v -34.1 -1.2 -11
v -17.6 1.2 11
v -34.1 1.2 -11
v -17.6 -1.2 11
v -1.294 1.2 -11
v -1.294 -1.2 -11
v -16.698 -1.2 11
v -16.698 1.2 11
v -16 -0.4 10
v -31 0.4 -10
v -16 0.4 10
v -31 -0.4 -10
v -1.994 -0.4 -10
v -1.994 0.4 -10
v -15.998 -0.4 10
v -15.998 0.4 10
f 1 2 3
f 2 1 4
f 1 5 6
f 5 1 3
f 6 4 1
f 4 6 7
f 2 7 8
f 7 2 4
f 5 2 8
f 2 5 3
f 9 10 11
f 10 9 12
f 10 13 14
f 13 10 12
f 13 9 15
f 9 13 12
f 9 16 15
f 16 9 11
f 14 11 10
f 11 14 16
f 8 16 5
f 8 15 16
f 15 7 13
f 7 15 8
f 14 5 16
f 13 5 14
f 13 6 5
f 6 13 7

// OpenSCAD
// file: craftKnife.scad
/*
    A knife handle for use with disposable razor blade. These blades can be easily found in 
    DIY stores, and pound shops as well as supermarkets.
    It requires the classic shaped blades with a hole in the middle. I found them in a pound shop.

	The blade is held in place by a wedge.
	
	Print Notes.
	    You can use a low infill (I use 10%)
	    The back of the knife tends to lift off of the bed, so either use a brim, or use the
	    "splat" module to help it adhere.
*/

length = 120; // Length of the knife
width = 23; // Must be a little larger than the width of the blade.
thickness = 10; // Thickness of the knife
extraThickness = 2; // Taper the top front of the knife.

hole = 6; // Diameter of the hole/wedge which holds the blade.
taper = 1; // Amount of taper on the wedge
slack = 0.5; // How much smaller the wedge is to the hole that it fits into.

module body()
{
	foo = 3; // Radius of the extra spheres for the wider top. (For asthetics only)
	bar = extraThickness * width/thickness/2 + width / 2; // Z offset for the extra spheres.
	difference() {
		translate([-5,0,0]) scale( [1,1,thickness/width] ) hull() {
			translate( [7,0,0] ) sphere( d=width ); // Front
			translate( [length - width,0,0] ) sphere( d=width ); // Back
			translate( [-10+foo, width/2 - foo, bar-foo] ) sphere( r=foo ); // Wider top
			translate( [-10+foo, width/2 - foo,-bar+foo] ) sphere( r=foo ); // Wider top
		}
	}
}

module bladeHole( thickness=1.5 )
{
	height=20;
	width=62;
	translate([-width/2,-height/2,-thickness/2]) linear_extrude( thickness ) {
		polygon( [[0,0],[62,0],[width-15,height],[15,height]] );
	}
}

module knife()
{

	difference() {
		body( length, width, thickness, extraThickness );
		bladeHole(); // gap for blade to fit in.
		translate( [0,0,-thickness] ) cylinder( d1=hole+slack+taper, d2=hole+slack-taper, h=thickness*2 );
	}
}

module wedge(void=true)
{
	difference() {
		intersection() {
			body( length, width, thickness, extraThickness );
			translate( [0,0,-thickness] ) cylinder( d1=hole+taper, d2=hole-taper, h=thickness*2 );
		}
		if (void) {
		    // Create a tiny void, which will force the slicer to make it more solid!
		    #translate( [0,0,-width/4+2] ) cylinder( d=0.4, h=20+width/2-4 ); 
	    }
	}
}

/*
    A bodge to held the back of the knife adhere to the print bed.
*/
module splat(d=15, h=0.3 )
{
    translate([length-27,0,-11.43]) cylinder( d=d, h=h );
}

// Rotate the knife, so that the top of the knife is on the build plate.
rotate( [-90,0,0] ) knife();

// A little bit of a bodge to allow the wedge to be printed at the same time as the knife,
// and to make one edge of the wedge to be level with the build platform.
// If you change 'width', 'thickness' or 'extraThicknes', then the rotation and translation will need tweaking.
rotate( [6,0,0] ) translate( [-20,0,-width/4-0.5] ) wedge();

splat();
// main file
/*
    A saftey cover for the blade while not in use.
    
    Note, there will be a small piece of blade showing, but impossible to touch it. In fact this could be
    consdered a feature, as you can cut string without taking off the cover!
    
    Print Notes
        To get a perfect fit, you will have to play with GAP.
        However, quick and simple way is to print it a little too big, and jam a piece a paper down the end!
        I think it works better with the paper, as it is easy to insert the blade, and only gets snug when the
        blade is 80% of the way in.
        
        THICKNESS should be a multiple of the printer's nozzle width, so that the lines are clean and smooth.
*/

use <craftKnife.scad>;

GAP=0.8;
THICKNESS=0.8;

rotate([90,0,0])
difference() {
    scale([1.1,1.1,1]) bladeHole(THICKNESS*2+GAP);
    bladeHole(THICKNESS);
    translate([-23,20,-5]) rotate([0,0,-55]) cube([100,100,10]);
}
